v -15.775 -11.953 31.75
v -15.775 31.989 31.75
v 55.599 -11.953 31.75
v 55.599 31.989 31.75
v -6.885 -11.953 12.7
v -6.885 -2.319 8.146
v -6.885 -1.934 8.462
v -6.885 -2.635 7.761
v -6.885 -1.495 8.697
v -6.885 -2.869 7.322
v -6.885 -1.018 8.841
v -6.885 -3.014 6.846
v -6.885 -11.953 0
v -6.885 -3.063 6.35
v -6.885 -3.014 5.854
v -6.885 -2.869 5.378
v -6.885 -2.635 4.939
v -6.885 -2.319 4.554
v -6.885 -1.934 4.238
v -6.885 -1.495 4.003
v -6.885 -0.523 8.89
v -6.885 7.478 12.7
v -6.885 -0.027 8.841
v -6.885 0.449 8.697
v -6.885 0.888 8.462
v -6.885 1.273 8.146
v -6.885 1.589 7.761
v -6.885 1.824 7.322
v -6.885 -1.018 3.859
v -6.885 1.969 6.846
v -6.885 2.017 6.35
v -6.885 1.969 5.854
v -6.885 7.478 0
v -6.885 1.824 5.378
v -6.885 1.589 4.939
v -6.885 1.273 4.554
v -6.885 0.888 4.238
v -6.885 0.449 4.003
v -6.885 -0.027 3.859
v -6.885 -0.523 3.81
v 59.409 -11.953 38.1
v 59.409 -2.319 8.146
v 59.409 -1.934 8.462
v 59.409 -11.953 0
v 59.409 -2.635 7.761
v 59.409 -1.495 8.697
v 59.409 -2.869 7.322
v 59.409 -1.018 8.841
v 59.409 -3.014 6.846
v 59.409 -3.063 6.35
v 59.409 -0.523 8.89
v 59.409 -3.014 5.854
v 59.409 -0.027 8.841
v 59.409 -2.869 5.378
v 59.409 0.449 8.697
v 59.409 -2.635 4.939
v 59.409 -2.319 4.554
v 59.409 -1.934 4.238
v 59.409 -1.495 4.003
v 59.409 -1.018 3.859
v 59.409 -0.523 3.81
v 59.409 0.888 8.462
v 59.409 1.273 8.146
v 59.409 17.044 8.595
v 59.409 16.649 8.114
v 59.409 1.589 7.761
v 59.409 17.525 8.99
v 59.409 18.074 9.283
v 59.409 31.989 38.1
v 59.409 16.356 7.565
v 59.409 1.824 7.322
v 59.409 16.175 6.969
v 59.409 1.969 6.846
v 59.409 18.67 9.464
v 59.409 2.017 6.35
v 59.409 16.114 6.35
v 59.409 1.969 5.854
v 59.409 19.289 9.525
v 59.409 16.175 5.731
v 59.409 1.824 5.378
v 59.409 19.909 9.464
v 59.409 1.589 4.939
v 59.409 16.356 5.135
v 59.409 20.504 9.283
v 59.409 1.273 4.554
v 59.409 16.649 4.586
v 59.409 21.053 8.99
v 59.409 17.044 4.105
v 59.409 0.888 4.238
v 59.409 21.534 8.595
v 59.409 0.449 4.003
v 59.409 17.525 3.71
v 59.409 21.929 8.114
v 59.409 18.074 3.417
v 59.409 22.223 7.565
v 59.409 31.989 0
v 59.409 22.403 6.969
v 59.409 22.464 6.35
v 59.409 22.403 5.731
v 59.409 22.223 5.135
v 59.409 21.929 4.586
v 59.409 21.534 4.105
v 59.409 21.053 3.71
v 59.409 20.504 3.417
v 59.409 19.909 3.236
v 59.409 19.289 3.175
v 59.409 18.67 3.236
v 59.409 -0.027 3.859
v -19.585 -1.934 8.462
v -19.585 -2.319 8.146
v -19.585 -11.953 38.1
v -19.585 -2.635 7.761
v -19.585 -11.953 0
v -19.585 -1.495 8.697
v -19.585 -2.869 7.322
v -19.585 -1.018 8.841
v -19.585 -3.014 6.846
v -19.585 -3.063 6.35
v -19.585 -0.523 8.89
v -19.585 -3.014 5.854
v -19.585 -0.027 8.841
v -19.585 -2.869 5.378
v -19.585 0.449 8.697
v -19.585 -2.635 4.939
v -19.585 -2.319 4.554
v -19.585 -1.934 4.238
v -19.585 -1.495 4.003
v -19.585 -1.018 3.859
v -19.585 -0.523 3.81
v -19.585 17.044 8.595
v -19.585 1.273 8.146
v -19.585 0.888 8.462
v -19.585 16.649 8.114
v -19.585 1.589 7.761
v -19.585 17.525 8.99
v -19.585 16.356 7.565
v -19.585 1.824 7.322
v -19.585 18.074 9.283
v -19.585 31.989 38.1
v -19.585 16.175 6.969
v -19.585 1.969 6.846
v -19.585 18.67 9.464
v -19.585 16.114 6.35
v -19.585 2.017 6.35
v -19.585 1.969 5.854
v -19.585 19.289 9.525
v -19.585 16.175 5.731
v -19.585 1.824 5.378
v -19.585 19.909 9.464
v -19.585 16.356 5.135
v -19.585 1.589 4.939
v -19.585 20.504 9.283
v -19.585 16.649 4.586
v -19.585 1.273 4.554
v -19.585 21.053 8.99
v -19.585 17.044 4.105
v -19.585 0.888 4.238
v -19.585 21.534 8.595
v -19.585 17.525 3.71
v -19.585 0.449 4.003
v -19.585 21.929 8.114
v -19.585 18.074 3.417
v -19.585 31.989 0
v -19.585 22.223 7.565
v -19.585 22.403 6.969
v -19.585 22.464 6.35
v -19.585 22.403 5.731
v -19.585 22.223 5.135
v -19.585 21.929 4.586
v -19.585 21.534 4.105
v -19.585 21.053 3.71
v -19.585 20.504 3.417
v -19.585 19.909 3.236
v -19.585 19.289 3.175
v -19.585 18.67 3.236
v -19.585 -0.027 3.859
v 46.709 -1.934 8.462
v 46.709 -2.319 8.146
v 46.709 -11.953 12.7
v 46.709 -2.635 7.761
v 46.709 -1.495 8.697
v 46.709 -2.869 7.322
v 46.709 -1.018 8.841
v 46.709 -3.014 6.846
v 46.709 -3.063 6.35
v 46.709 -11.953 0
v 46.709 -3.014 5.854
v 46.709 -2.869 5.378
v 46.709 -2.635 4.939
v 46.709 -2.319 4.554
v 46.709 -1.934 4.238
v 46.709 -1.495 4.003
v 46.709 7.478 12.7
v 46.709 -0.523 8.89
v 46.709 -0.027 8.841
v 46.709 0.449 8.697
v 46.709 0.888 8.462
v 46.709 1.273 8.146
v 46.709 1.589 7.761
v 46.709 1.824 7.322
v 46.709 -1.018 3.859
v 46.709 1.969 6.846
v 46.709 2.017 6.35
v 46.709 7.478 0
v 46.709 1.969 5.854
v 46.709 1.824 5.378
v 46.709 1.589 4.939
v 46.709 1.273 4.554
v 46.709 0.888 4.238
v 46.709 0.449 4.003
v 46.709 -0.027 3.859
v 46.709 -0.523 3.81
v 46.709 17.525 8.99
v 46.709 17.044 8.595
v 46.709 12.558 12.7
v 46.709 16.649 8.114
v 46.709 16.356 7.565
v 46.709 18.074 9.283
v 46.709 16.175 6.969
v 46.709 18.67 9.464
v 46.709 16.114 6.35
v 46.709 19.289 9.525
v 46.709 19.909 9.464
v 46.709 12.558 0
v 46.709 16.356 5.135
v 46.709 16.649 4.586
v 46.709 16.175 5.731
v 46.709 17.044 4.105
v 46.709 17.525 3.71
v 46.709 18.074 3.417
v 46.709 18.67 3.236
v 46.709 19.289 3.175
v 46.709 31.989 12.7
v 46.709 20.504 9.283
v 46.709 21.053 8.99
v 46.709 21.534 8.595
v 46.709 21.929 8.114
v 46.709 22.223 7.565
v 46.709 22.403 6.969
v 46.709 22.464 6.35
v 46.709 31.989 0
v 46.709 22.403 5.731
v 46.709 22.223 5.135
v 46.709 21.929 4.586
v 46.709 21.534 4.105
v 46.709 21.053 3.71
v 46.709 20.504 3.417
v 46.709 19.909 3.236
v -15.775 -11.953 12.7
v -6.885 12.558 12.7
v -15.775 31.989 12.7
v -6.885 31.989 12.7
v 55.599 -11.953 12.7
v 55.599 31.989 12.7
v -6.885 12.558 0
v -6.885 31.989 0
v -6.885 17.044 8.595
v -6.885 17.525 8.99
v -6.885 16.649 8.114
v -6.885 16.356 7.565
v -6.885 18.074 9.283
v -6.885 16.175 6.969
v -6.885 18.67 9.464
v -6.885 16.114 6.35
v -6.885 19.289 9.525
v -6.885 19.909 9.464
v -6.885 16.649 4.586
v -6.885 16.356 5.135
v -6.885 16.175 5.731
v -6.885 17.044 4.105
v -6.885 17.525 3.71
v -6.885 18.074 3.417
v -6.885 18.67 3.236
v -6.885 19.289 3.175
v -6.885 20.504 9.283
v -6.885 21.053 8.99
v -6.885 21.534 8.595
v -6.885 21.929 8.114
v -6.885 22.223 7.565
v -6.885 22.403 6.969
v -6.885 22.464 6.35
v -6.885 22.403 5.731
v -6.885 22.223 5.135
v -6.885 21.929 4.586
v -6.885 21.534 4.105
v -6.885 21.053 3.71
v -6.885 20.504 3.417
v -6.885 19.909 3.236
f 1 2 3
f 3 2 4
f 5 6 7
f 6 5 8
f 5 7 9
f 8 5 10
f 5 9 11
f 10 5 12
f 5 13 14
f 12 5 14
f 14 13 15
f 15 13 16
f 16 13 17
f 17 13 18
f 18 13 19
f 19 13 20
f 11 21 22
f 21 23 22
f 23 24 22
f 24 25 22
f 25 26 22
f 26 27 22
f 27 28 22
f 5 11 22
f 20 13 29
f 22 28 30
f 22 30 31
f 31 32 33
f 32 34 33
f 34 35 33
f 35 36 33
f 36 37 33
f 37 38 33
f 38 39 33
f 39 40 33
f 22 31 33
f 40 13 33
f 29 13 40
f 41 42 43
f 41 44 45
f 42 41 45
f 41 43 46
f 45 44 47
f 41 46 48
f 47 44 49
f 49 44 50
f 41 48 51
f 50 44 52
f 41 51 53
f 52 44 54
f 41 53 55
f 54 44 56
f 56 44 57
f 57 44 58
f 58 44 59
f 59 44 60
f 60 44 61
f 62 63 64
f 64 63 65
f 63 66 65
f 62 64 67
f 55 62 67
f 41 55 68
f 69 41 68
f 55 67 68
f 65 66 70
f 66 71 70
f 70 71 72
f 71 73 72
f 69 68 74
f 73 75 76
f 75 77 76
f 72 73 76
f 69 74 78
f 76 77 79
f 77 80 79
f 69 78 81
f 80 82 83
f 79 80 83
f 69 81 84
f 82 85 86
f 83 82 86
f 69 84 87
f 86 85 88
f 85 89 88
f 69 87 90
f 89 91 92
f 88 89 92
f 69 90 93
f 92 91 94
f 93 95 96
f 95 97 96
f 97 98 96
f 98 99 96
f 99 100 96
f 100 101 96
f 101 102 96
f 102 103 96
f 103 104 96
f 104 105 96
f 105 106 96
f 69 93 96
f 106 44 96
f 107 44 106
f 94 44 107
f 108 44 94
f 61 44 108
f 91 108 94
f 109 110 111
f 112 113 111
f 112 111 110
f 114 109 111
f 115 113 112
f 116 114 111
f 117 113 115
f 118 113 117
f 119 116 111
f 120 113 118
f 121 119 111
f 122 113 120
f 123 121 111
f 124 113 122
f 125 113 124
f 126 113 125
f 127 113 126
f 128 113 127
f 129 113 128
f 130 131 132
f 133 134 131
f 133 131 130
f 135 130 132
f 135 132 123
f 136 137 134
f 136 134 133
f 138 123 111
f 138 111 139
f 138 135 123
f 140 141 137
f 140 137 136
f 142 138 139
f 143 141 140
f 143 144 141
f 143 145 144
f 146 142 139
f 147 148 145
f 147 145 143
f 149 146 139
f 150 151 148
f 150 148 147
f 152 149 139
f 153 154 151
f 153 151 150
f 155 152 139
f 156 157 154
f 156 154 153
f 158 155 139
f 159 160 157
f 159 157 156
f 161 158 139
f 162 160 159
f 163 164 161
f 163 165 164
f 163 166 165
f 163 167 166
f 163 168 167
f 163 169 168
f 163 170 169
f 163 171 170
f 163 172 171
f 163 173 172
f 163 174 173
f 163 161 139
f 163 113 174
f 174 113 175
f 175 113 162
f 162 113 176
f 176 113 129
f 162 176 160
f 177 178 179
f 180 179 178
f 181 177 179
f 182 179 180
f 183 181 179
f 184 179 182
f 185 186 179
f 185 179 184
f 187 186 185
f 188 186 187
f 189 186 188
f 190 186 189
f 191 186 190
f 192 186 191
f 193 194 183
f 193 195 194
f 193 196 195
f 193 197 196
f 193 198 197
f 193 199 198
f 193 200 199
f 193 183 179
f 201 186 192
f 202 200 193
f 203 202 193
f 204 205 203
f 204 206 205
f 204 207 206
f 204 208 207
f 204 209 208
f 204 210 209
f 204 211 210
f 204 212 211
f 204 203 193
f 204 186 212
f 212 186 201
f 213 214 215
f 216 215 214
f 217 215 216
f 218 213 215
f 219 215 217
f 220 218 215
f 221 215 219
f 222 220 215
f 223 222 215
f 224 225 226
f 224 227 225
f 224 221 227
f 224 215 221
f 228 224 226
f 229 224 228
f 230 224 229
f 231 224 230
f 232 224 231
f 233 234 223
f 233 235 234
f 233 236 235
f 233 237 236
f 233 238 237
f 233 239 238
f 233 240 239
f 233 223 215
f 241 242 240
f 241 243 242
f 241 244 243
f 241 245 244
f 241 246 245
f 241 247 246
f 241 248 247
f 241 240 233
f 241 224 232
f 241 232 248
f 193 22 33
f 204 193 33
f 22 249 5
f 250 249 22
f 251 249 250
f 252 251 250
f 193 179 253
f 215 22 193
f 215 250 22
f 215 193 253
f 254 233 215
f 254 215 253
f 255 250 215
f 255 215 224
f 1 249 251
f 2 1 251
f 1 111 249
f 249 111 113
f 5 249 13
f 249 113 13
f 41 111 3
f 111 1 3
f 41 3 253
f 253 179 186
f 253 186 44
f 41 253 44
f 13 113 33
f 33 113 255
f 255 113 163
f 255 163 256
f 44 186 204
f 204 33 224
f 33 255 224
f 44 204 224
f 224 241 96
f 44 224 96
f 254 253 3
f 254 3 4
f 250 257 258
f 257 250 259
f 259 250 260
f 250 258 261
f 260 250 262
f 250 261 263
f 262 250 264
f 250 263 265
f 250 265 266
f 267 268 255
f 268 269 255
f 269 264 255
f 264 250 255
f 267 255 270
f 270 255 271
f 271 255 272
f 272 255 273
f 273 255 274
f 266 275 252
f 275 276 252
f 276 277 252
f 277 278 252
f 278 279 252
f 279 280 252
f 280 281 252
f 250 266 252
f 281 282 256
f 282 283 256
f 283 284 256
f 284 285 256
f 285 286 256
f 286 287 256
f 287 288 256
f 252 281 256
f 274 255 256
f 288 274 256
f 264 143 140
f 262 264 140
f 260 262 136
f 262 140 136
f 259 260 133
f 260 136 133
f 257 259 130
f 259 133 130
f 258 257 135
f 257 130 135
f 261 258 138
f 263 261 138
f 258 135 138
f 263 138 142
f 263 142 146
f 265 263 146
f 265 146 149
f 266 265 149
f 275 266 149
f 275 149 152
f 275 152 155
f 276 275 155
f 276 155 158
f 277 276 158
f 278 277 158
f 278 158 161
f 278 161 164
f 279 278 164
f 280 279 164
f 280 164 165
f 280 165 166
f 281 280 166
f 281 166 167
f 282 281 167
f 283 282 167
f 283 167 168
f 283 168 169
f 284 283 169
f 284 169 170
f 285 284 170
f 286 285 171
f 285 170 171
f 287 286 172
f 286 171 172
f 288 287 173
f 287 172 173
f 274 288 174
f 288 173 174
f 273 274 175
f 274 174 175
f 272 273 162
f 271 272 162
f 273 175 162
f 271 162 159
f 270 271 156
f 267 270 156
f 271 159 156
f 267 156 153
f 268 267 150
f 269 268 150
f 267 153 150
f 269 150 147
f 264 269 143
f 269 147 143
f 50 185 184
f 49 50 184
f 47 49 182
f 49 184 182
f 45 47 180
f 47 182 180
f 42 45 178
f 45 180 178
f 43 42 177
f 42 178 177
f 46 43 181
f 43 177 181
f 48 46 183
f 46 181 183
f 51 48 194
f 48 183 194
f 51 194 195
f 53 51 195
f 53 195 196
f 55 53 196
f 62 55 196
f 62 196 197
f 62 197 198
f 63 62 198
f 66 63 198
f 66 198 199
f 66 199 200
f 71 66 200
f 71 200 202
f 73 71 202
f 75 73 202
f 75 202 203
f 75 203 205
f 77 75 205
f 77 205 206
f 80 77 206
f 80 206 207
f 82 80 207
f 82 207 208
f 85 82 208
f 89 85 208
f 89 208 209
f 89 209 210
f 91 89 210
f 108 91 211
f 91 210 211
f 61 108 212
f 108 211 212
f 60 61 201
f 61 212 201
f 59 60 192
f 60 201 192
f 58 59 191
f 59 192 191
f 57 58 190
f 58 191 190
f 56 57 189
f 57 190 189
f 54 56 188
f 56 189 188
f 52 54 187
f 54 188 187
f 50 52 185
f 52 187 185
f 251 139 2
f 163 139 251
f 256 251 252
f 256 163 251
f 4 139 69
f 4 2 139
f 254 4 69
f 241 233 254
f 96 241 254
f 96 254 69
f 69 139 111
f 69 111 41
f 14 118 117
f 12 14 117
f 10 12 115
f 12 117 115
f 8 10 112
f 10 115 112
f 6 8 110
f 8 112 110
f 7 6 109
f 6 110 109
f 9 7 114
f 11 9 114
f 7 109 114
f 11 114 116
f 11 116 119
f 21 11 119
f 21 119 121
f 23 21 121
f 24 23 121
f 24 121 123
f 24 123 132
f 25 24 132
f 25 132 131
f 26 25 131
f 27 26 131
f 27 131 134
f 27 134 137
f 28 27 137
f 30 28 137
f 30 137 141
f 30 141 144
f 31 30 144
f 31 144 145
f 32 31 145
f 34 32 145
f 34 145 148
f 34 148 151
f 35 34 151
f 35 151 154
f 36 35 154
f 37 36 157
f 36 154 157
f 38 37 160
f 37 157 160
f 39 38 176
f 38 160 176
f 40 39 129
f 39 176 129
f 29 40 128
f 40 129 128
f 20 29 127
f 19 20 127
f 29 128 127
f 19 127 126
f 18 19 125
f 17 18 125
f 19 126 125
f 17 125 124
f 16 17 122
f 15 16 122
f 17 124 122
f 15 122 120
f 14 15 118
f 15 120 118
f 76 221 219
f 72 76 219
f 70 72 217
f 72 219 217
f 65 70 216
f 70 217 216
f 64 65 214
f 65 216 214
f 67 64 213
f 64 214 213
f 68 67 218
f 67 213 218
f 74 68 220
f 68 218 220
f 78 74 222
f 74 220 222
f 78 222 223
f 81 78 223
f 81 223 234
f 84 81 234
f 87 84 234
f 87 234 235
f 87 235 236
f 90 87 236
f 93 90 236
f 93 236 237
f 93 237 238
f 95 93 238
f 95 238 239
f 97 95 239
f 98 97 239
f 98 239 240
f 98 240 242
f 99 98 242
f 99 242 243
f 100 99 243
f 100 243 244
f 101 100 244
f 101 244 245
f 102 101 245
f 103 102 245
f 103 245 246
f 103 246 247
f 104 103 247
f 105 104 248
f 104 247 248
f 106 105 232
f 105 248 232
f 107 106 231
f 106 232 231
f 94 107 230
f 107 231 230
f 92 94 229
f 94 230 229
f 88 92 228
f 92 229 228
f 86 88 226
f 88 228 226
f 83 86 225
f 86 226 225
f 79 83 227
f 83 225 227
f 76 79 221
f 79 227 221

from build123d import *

# Parameters (mm, degrees)
SKETCH1_W             = 12.7
SKETCH1_H             = 43.942
BOSS_EXTRUDE1_DEPTH   = 12.7
BOSS_EXTRUDE1_2_DEPTH = 12.7
SKETCH2_R             = 3.175
SKETCH2_R_2           = 2.54
CUT_EXTRUDE1_DEPTH    = 87.166453569
BOSS_EXTRUDE3_REACH   = 76.696
SKETCH4_W             = 12.7
SKETCH4_H             = 5.08
SKETCH5_W             = 3.81
SKETCH5_H             = 43.942
BOSS_EXTRUDE4_DEPTH   = 19.05
SKETCH6_W             = 78.994
SKETCH6_H             = 43.942
BOSS_EXTRUDE5_DEPTH   = 6.35


with BuildPart() as part:
    # Sketch1 → Boss-Extrude1 (new body)
    with BuildSketch(Plane.XY):
        with Locations((-13.235289256, 10.018305785)):
            Rectangle(SKETCH1_W, SKETCH1_H)
    extrude(amount=BOSS_EXTRUDE1_DEPTH)


with BuildPart() as body_2:
    # Sketch1 → Boss-Extrude1 2 (new body)
    with BuildSketch(Plane.XY):
        with Locations((53.058710744, 10.018305785)):
            Rectangle(SKETCH1_W, SKETCH1_H)
    extrude(amount=BOSS_EXTRUDE1_2_DEPTH)


with BuildPart() as cut_extrude1_tool:
    # Sketch2 → Cut-Extrude1 (new, through all)
    with BuildSketch(Plane.ZY.offset(19.585289256)):
        with Locations(Location((6.35, 19.289305785, 0), (0, 0, 270))):
            Circle(SKETCH2_R)
        with Locations(Location((6.35, -0.522694215, 0), (0, 0, 270))):
            Circle(SKETCH2_R_2)
    extrude(amount=-CUT_EXTRUDE1_DEPTH)


with BuildPart() as part_1:
    add(part.part)

    # Cut-Extrude1: cut by cut_extrude1_tool
    add(cut_extrude1_tool.part, mode=Mode.SUBTRACT)


with BuildPart() as body_2_1:
    add(body_2.part)

    # Cut-Extrude1: cut by cut_extrude1_tool
    add(cut_extrude1_tool.part, mode=Mode.SUBTRACT)

    # Sketch4 → Boss-Extrude3 (add, up to next)
    with BuildSketch(Plane(origin=(-6.885289256, 0, 0), x_dir=(0, 0, -1), z_dir=(1, 0, 0)), mode=Mode.PRIVATE) as boss_extrude3_sk1:
        with Locations((-6.35, 10.018305785)):
            Rectangle(SKETCH4_W, SKETCH4_H)
    boss_extrude3_tool1 = extrude(boss_extrude3_sk1.sketch, amount=BOSS_EXTRUDE3_REACH, mode=Mode.PRIVATE) - body_2_1.part

    add(part_1.part)  # Boss-Extrude3 merges part
    add(boss_extrude3_tool1.solids().sort_by_distance((-6.885289, 10.018306, 6.35))[0])

    # Sketch5 → Boss-Extrude4 (add)
    with BuildSketch(Plane.XY.offset(12.7)):
        with Locations((-17.680289256, 10.018305785)):
            Rectangle(SKETCH5_W, SKETCH5_H)
        with Locations((57.503710744, 10.018305785)):
            Rectangle(SKETCH5_W, SKETCH5_H)
    extrude(amount=BOSS_EXTRUDE4_DEPTH)

    # Sketch6 → Boss-Extrude5 (add)
    with BuildSketch(Plane.XY.offset(31.75)):
        with Locations((19.911710744, 10.018305785)):
            Rectangle(SKETCH6_W, SKETCH6_H)
    extrude(amount=BOSS_EXTRUDE5_DEPTH)


solid = body_2_1.part
